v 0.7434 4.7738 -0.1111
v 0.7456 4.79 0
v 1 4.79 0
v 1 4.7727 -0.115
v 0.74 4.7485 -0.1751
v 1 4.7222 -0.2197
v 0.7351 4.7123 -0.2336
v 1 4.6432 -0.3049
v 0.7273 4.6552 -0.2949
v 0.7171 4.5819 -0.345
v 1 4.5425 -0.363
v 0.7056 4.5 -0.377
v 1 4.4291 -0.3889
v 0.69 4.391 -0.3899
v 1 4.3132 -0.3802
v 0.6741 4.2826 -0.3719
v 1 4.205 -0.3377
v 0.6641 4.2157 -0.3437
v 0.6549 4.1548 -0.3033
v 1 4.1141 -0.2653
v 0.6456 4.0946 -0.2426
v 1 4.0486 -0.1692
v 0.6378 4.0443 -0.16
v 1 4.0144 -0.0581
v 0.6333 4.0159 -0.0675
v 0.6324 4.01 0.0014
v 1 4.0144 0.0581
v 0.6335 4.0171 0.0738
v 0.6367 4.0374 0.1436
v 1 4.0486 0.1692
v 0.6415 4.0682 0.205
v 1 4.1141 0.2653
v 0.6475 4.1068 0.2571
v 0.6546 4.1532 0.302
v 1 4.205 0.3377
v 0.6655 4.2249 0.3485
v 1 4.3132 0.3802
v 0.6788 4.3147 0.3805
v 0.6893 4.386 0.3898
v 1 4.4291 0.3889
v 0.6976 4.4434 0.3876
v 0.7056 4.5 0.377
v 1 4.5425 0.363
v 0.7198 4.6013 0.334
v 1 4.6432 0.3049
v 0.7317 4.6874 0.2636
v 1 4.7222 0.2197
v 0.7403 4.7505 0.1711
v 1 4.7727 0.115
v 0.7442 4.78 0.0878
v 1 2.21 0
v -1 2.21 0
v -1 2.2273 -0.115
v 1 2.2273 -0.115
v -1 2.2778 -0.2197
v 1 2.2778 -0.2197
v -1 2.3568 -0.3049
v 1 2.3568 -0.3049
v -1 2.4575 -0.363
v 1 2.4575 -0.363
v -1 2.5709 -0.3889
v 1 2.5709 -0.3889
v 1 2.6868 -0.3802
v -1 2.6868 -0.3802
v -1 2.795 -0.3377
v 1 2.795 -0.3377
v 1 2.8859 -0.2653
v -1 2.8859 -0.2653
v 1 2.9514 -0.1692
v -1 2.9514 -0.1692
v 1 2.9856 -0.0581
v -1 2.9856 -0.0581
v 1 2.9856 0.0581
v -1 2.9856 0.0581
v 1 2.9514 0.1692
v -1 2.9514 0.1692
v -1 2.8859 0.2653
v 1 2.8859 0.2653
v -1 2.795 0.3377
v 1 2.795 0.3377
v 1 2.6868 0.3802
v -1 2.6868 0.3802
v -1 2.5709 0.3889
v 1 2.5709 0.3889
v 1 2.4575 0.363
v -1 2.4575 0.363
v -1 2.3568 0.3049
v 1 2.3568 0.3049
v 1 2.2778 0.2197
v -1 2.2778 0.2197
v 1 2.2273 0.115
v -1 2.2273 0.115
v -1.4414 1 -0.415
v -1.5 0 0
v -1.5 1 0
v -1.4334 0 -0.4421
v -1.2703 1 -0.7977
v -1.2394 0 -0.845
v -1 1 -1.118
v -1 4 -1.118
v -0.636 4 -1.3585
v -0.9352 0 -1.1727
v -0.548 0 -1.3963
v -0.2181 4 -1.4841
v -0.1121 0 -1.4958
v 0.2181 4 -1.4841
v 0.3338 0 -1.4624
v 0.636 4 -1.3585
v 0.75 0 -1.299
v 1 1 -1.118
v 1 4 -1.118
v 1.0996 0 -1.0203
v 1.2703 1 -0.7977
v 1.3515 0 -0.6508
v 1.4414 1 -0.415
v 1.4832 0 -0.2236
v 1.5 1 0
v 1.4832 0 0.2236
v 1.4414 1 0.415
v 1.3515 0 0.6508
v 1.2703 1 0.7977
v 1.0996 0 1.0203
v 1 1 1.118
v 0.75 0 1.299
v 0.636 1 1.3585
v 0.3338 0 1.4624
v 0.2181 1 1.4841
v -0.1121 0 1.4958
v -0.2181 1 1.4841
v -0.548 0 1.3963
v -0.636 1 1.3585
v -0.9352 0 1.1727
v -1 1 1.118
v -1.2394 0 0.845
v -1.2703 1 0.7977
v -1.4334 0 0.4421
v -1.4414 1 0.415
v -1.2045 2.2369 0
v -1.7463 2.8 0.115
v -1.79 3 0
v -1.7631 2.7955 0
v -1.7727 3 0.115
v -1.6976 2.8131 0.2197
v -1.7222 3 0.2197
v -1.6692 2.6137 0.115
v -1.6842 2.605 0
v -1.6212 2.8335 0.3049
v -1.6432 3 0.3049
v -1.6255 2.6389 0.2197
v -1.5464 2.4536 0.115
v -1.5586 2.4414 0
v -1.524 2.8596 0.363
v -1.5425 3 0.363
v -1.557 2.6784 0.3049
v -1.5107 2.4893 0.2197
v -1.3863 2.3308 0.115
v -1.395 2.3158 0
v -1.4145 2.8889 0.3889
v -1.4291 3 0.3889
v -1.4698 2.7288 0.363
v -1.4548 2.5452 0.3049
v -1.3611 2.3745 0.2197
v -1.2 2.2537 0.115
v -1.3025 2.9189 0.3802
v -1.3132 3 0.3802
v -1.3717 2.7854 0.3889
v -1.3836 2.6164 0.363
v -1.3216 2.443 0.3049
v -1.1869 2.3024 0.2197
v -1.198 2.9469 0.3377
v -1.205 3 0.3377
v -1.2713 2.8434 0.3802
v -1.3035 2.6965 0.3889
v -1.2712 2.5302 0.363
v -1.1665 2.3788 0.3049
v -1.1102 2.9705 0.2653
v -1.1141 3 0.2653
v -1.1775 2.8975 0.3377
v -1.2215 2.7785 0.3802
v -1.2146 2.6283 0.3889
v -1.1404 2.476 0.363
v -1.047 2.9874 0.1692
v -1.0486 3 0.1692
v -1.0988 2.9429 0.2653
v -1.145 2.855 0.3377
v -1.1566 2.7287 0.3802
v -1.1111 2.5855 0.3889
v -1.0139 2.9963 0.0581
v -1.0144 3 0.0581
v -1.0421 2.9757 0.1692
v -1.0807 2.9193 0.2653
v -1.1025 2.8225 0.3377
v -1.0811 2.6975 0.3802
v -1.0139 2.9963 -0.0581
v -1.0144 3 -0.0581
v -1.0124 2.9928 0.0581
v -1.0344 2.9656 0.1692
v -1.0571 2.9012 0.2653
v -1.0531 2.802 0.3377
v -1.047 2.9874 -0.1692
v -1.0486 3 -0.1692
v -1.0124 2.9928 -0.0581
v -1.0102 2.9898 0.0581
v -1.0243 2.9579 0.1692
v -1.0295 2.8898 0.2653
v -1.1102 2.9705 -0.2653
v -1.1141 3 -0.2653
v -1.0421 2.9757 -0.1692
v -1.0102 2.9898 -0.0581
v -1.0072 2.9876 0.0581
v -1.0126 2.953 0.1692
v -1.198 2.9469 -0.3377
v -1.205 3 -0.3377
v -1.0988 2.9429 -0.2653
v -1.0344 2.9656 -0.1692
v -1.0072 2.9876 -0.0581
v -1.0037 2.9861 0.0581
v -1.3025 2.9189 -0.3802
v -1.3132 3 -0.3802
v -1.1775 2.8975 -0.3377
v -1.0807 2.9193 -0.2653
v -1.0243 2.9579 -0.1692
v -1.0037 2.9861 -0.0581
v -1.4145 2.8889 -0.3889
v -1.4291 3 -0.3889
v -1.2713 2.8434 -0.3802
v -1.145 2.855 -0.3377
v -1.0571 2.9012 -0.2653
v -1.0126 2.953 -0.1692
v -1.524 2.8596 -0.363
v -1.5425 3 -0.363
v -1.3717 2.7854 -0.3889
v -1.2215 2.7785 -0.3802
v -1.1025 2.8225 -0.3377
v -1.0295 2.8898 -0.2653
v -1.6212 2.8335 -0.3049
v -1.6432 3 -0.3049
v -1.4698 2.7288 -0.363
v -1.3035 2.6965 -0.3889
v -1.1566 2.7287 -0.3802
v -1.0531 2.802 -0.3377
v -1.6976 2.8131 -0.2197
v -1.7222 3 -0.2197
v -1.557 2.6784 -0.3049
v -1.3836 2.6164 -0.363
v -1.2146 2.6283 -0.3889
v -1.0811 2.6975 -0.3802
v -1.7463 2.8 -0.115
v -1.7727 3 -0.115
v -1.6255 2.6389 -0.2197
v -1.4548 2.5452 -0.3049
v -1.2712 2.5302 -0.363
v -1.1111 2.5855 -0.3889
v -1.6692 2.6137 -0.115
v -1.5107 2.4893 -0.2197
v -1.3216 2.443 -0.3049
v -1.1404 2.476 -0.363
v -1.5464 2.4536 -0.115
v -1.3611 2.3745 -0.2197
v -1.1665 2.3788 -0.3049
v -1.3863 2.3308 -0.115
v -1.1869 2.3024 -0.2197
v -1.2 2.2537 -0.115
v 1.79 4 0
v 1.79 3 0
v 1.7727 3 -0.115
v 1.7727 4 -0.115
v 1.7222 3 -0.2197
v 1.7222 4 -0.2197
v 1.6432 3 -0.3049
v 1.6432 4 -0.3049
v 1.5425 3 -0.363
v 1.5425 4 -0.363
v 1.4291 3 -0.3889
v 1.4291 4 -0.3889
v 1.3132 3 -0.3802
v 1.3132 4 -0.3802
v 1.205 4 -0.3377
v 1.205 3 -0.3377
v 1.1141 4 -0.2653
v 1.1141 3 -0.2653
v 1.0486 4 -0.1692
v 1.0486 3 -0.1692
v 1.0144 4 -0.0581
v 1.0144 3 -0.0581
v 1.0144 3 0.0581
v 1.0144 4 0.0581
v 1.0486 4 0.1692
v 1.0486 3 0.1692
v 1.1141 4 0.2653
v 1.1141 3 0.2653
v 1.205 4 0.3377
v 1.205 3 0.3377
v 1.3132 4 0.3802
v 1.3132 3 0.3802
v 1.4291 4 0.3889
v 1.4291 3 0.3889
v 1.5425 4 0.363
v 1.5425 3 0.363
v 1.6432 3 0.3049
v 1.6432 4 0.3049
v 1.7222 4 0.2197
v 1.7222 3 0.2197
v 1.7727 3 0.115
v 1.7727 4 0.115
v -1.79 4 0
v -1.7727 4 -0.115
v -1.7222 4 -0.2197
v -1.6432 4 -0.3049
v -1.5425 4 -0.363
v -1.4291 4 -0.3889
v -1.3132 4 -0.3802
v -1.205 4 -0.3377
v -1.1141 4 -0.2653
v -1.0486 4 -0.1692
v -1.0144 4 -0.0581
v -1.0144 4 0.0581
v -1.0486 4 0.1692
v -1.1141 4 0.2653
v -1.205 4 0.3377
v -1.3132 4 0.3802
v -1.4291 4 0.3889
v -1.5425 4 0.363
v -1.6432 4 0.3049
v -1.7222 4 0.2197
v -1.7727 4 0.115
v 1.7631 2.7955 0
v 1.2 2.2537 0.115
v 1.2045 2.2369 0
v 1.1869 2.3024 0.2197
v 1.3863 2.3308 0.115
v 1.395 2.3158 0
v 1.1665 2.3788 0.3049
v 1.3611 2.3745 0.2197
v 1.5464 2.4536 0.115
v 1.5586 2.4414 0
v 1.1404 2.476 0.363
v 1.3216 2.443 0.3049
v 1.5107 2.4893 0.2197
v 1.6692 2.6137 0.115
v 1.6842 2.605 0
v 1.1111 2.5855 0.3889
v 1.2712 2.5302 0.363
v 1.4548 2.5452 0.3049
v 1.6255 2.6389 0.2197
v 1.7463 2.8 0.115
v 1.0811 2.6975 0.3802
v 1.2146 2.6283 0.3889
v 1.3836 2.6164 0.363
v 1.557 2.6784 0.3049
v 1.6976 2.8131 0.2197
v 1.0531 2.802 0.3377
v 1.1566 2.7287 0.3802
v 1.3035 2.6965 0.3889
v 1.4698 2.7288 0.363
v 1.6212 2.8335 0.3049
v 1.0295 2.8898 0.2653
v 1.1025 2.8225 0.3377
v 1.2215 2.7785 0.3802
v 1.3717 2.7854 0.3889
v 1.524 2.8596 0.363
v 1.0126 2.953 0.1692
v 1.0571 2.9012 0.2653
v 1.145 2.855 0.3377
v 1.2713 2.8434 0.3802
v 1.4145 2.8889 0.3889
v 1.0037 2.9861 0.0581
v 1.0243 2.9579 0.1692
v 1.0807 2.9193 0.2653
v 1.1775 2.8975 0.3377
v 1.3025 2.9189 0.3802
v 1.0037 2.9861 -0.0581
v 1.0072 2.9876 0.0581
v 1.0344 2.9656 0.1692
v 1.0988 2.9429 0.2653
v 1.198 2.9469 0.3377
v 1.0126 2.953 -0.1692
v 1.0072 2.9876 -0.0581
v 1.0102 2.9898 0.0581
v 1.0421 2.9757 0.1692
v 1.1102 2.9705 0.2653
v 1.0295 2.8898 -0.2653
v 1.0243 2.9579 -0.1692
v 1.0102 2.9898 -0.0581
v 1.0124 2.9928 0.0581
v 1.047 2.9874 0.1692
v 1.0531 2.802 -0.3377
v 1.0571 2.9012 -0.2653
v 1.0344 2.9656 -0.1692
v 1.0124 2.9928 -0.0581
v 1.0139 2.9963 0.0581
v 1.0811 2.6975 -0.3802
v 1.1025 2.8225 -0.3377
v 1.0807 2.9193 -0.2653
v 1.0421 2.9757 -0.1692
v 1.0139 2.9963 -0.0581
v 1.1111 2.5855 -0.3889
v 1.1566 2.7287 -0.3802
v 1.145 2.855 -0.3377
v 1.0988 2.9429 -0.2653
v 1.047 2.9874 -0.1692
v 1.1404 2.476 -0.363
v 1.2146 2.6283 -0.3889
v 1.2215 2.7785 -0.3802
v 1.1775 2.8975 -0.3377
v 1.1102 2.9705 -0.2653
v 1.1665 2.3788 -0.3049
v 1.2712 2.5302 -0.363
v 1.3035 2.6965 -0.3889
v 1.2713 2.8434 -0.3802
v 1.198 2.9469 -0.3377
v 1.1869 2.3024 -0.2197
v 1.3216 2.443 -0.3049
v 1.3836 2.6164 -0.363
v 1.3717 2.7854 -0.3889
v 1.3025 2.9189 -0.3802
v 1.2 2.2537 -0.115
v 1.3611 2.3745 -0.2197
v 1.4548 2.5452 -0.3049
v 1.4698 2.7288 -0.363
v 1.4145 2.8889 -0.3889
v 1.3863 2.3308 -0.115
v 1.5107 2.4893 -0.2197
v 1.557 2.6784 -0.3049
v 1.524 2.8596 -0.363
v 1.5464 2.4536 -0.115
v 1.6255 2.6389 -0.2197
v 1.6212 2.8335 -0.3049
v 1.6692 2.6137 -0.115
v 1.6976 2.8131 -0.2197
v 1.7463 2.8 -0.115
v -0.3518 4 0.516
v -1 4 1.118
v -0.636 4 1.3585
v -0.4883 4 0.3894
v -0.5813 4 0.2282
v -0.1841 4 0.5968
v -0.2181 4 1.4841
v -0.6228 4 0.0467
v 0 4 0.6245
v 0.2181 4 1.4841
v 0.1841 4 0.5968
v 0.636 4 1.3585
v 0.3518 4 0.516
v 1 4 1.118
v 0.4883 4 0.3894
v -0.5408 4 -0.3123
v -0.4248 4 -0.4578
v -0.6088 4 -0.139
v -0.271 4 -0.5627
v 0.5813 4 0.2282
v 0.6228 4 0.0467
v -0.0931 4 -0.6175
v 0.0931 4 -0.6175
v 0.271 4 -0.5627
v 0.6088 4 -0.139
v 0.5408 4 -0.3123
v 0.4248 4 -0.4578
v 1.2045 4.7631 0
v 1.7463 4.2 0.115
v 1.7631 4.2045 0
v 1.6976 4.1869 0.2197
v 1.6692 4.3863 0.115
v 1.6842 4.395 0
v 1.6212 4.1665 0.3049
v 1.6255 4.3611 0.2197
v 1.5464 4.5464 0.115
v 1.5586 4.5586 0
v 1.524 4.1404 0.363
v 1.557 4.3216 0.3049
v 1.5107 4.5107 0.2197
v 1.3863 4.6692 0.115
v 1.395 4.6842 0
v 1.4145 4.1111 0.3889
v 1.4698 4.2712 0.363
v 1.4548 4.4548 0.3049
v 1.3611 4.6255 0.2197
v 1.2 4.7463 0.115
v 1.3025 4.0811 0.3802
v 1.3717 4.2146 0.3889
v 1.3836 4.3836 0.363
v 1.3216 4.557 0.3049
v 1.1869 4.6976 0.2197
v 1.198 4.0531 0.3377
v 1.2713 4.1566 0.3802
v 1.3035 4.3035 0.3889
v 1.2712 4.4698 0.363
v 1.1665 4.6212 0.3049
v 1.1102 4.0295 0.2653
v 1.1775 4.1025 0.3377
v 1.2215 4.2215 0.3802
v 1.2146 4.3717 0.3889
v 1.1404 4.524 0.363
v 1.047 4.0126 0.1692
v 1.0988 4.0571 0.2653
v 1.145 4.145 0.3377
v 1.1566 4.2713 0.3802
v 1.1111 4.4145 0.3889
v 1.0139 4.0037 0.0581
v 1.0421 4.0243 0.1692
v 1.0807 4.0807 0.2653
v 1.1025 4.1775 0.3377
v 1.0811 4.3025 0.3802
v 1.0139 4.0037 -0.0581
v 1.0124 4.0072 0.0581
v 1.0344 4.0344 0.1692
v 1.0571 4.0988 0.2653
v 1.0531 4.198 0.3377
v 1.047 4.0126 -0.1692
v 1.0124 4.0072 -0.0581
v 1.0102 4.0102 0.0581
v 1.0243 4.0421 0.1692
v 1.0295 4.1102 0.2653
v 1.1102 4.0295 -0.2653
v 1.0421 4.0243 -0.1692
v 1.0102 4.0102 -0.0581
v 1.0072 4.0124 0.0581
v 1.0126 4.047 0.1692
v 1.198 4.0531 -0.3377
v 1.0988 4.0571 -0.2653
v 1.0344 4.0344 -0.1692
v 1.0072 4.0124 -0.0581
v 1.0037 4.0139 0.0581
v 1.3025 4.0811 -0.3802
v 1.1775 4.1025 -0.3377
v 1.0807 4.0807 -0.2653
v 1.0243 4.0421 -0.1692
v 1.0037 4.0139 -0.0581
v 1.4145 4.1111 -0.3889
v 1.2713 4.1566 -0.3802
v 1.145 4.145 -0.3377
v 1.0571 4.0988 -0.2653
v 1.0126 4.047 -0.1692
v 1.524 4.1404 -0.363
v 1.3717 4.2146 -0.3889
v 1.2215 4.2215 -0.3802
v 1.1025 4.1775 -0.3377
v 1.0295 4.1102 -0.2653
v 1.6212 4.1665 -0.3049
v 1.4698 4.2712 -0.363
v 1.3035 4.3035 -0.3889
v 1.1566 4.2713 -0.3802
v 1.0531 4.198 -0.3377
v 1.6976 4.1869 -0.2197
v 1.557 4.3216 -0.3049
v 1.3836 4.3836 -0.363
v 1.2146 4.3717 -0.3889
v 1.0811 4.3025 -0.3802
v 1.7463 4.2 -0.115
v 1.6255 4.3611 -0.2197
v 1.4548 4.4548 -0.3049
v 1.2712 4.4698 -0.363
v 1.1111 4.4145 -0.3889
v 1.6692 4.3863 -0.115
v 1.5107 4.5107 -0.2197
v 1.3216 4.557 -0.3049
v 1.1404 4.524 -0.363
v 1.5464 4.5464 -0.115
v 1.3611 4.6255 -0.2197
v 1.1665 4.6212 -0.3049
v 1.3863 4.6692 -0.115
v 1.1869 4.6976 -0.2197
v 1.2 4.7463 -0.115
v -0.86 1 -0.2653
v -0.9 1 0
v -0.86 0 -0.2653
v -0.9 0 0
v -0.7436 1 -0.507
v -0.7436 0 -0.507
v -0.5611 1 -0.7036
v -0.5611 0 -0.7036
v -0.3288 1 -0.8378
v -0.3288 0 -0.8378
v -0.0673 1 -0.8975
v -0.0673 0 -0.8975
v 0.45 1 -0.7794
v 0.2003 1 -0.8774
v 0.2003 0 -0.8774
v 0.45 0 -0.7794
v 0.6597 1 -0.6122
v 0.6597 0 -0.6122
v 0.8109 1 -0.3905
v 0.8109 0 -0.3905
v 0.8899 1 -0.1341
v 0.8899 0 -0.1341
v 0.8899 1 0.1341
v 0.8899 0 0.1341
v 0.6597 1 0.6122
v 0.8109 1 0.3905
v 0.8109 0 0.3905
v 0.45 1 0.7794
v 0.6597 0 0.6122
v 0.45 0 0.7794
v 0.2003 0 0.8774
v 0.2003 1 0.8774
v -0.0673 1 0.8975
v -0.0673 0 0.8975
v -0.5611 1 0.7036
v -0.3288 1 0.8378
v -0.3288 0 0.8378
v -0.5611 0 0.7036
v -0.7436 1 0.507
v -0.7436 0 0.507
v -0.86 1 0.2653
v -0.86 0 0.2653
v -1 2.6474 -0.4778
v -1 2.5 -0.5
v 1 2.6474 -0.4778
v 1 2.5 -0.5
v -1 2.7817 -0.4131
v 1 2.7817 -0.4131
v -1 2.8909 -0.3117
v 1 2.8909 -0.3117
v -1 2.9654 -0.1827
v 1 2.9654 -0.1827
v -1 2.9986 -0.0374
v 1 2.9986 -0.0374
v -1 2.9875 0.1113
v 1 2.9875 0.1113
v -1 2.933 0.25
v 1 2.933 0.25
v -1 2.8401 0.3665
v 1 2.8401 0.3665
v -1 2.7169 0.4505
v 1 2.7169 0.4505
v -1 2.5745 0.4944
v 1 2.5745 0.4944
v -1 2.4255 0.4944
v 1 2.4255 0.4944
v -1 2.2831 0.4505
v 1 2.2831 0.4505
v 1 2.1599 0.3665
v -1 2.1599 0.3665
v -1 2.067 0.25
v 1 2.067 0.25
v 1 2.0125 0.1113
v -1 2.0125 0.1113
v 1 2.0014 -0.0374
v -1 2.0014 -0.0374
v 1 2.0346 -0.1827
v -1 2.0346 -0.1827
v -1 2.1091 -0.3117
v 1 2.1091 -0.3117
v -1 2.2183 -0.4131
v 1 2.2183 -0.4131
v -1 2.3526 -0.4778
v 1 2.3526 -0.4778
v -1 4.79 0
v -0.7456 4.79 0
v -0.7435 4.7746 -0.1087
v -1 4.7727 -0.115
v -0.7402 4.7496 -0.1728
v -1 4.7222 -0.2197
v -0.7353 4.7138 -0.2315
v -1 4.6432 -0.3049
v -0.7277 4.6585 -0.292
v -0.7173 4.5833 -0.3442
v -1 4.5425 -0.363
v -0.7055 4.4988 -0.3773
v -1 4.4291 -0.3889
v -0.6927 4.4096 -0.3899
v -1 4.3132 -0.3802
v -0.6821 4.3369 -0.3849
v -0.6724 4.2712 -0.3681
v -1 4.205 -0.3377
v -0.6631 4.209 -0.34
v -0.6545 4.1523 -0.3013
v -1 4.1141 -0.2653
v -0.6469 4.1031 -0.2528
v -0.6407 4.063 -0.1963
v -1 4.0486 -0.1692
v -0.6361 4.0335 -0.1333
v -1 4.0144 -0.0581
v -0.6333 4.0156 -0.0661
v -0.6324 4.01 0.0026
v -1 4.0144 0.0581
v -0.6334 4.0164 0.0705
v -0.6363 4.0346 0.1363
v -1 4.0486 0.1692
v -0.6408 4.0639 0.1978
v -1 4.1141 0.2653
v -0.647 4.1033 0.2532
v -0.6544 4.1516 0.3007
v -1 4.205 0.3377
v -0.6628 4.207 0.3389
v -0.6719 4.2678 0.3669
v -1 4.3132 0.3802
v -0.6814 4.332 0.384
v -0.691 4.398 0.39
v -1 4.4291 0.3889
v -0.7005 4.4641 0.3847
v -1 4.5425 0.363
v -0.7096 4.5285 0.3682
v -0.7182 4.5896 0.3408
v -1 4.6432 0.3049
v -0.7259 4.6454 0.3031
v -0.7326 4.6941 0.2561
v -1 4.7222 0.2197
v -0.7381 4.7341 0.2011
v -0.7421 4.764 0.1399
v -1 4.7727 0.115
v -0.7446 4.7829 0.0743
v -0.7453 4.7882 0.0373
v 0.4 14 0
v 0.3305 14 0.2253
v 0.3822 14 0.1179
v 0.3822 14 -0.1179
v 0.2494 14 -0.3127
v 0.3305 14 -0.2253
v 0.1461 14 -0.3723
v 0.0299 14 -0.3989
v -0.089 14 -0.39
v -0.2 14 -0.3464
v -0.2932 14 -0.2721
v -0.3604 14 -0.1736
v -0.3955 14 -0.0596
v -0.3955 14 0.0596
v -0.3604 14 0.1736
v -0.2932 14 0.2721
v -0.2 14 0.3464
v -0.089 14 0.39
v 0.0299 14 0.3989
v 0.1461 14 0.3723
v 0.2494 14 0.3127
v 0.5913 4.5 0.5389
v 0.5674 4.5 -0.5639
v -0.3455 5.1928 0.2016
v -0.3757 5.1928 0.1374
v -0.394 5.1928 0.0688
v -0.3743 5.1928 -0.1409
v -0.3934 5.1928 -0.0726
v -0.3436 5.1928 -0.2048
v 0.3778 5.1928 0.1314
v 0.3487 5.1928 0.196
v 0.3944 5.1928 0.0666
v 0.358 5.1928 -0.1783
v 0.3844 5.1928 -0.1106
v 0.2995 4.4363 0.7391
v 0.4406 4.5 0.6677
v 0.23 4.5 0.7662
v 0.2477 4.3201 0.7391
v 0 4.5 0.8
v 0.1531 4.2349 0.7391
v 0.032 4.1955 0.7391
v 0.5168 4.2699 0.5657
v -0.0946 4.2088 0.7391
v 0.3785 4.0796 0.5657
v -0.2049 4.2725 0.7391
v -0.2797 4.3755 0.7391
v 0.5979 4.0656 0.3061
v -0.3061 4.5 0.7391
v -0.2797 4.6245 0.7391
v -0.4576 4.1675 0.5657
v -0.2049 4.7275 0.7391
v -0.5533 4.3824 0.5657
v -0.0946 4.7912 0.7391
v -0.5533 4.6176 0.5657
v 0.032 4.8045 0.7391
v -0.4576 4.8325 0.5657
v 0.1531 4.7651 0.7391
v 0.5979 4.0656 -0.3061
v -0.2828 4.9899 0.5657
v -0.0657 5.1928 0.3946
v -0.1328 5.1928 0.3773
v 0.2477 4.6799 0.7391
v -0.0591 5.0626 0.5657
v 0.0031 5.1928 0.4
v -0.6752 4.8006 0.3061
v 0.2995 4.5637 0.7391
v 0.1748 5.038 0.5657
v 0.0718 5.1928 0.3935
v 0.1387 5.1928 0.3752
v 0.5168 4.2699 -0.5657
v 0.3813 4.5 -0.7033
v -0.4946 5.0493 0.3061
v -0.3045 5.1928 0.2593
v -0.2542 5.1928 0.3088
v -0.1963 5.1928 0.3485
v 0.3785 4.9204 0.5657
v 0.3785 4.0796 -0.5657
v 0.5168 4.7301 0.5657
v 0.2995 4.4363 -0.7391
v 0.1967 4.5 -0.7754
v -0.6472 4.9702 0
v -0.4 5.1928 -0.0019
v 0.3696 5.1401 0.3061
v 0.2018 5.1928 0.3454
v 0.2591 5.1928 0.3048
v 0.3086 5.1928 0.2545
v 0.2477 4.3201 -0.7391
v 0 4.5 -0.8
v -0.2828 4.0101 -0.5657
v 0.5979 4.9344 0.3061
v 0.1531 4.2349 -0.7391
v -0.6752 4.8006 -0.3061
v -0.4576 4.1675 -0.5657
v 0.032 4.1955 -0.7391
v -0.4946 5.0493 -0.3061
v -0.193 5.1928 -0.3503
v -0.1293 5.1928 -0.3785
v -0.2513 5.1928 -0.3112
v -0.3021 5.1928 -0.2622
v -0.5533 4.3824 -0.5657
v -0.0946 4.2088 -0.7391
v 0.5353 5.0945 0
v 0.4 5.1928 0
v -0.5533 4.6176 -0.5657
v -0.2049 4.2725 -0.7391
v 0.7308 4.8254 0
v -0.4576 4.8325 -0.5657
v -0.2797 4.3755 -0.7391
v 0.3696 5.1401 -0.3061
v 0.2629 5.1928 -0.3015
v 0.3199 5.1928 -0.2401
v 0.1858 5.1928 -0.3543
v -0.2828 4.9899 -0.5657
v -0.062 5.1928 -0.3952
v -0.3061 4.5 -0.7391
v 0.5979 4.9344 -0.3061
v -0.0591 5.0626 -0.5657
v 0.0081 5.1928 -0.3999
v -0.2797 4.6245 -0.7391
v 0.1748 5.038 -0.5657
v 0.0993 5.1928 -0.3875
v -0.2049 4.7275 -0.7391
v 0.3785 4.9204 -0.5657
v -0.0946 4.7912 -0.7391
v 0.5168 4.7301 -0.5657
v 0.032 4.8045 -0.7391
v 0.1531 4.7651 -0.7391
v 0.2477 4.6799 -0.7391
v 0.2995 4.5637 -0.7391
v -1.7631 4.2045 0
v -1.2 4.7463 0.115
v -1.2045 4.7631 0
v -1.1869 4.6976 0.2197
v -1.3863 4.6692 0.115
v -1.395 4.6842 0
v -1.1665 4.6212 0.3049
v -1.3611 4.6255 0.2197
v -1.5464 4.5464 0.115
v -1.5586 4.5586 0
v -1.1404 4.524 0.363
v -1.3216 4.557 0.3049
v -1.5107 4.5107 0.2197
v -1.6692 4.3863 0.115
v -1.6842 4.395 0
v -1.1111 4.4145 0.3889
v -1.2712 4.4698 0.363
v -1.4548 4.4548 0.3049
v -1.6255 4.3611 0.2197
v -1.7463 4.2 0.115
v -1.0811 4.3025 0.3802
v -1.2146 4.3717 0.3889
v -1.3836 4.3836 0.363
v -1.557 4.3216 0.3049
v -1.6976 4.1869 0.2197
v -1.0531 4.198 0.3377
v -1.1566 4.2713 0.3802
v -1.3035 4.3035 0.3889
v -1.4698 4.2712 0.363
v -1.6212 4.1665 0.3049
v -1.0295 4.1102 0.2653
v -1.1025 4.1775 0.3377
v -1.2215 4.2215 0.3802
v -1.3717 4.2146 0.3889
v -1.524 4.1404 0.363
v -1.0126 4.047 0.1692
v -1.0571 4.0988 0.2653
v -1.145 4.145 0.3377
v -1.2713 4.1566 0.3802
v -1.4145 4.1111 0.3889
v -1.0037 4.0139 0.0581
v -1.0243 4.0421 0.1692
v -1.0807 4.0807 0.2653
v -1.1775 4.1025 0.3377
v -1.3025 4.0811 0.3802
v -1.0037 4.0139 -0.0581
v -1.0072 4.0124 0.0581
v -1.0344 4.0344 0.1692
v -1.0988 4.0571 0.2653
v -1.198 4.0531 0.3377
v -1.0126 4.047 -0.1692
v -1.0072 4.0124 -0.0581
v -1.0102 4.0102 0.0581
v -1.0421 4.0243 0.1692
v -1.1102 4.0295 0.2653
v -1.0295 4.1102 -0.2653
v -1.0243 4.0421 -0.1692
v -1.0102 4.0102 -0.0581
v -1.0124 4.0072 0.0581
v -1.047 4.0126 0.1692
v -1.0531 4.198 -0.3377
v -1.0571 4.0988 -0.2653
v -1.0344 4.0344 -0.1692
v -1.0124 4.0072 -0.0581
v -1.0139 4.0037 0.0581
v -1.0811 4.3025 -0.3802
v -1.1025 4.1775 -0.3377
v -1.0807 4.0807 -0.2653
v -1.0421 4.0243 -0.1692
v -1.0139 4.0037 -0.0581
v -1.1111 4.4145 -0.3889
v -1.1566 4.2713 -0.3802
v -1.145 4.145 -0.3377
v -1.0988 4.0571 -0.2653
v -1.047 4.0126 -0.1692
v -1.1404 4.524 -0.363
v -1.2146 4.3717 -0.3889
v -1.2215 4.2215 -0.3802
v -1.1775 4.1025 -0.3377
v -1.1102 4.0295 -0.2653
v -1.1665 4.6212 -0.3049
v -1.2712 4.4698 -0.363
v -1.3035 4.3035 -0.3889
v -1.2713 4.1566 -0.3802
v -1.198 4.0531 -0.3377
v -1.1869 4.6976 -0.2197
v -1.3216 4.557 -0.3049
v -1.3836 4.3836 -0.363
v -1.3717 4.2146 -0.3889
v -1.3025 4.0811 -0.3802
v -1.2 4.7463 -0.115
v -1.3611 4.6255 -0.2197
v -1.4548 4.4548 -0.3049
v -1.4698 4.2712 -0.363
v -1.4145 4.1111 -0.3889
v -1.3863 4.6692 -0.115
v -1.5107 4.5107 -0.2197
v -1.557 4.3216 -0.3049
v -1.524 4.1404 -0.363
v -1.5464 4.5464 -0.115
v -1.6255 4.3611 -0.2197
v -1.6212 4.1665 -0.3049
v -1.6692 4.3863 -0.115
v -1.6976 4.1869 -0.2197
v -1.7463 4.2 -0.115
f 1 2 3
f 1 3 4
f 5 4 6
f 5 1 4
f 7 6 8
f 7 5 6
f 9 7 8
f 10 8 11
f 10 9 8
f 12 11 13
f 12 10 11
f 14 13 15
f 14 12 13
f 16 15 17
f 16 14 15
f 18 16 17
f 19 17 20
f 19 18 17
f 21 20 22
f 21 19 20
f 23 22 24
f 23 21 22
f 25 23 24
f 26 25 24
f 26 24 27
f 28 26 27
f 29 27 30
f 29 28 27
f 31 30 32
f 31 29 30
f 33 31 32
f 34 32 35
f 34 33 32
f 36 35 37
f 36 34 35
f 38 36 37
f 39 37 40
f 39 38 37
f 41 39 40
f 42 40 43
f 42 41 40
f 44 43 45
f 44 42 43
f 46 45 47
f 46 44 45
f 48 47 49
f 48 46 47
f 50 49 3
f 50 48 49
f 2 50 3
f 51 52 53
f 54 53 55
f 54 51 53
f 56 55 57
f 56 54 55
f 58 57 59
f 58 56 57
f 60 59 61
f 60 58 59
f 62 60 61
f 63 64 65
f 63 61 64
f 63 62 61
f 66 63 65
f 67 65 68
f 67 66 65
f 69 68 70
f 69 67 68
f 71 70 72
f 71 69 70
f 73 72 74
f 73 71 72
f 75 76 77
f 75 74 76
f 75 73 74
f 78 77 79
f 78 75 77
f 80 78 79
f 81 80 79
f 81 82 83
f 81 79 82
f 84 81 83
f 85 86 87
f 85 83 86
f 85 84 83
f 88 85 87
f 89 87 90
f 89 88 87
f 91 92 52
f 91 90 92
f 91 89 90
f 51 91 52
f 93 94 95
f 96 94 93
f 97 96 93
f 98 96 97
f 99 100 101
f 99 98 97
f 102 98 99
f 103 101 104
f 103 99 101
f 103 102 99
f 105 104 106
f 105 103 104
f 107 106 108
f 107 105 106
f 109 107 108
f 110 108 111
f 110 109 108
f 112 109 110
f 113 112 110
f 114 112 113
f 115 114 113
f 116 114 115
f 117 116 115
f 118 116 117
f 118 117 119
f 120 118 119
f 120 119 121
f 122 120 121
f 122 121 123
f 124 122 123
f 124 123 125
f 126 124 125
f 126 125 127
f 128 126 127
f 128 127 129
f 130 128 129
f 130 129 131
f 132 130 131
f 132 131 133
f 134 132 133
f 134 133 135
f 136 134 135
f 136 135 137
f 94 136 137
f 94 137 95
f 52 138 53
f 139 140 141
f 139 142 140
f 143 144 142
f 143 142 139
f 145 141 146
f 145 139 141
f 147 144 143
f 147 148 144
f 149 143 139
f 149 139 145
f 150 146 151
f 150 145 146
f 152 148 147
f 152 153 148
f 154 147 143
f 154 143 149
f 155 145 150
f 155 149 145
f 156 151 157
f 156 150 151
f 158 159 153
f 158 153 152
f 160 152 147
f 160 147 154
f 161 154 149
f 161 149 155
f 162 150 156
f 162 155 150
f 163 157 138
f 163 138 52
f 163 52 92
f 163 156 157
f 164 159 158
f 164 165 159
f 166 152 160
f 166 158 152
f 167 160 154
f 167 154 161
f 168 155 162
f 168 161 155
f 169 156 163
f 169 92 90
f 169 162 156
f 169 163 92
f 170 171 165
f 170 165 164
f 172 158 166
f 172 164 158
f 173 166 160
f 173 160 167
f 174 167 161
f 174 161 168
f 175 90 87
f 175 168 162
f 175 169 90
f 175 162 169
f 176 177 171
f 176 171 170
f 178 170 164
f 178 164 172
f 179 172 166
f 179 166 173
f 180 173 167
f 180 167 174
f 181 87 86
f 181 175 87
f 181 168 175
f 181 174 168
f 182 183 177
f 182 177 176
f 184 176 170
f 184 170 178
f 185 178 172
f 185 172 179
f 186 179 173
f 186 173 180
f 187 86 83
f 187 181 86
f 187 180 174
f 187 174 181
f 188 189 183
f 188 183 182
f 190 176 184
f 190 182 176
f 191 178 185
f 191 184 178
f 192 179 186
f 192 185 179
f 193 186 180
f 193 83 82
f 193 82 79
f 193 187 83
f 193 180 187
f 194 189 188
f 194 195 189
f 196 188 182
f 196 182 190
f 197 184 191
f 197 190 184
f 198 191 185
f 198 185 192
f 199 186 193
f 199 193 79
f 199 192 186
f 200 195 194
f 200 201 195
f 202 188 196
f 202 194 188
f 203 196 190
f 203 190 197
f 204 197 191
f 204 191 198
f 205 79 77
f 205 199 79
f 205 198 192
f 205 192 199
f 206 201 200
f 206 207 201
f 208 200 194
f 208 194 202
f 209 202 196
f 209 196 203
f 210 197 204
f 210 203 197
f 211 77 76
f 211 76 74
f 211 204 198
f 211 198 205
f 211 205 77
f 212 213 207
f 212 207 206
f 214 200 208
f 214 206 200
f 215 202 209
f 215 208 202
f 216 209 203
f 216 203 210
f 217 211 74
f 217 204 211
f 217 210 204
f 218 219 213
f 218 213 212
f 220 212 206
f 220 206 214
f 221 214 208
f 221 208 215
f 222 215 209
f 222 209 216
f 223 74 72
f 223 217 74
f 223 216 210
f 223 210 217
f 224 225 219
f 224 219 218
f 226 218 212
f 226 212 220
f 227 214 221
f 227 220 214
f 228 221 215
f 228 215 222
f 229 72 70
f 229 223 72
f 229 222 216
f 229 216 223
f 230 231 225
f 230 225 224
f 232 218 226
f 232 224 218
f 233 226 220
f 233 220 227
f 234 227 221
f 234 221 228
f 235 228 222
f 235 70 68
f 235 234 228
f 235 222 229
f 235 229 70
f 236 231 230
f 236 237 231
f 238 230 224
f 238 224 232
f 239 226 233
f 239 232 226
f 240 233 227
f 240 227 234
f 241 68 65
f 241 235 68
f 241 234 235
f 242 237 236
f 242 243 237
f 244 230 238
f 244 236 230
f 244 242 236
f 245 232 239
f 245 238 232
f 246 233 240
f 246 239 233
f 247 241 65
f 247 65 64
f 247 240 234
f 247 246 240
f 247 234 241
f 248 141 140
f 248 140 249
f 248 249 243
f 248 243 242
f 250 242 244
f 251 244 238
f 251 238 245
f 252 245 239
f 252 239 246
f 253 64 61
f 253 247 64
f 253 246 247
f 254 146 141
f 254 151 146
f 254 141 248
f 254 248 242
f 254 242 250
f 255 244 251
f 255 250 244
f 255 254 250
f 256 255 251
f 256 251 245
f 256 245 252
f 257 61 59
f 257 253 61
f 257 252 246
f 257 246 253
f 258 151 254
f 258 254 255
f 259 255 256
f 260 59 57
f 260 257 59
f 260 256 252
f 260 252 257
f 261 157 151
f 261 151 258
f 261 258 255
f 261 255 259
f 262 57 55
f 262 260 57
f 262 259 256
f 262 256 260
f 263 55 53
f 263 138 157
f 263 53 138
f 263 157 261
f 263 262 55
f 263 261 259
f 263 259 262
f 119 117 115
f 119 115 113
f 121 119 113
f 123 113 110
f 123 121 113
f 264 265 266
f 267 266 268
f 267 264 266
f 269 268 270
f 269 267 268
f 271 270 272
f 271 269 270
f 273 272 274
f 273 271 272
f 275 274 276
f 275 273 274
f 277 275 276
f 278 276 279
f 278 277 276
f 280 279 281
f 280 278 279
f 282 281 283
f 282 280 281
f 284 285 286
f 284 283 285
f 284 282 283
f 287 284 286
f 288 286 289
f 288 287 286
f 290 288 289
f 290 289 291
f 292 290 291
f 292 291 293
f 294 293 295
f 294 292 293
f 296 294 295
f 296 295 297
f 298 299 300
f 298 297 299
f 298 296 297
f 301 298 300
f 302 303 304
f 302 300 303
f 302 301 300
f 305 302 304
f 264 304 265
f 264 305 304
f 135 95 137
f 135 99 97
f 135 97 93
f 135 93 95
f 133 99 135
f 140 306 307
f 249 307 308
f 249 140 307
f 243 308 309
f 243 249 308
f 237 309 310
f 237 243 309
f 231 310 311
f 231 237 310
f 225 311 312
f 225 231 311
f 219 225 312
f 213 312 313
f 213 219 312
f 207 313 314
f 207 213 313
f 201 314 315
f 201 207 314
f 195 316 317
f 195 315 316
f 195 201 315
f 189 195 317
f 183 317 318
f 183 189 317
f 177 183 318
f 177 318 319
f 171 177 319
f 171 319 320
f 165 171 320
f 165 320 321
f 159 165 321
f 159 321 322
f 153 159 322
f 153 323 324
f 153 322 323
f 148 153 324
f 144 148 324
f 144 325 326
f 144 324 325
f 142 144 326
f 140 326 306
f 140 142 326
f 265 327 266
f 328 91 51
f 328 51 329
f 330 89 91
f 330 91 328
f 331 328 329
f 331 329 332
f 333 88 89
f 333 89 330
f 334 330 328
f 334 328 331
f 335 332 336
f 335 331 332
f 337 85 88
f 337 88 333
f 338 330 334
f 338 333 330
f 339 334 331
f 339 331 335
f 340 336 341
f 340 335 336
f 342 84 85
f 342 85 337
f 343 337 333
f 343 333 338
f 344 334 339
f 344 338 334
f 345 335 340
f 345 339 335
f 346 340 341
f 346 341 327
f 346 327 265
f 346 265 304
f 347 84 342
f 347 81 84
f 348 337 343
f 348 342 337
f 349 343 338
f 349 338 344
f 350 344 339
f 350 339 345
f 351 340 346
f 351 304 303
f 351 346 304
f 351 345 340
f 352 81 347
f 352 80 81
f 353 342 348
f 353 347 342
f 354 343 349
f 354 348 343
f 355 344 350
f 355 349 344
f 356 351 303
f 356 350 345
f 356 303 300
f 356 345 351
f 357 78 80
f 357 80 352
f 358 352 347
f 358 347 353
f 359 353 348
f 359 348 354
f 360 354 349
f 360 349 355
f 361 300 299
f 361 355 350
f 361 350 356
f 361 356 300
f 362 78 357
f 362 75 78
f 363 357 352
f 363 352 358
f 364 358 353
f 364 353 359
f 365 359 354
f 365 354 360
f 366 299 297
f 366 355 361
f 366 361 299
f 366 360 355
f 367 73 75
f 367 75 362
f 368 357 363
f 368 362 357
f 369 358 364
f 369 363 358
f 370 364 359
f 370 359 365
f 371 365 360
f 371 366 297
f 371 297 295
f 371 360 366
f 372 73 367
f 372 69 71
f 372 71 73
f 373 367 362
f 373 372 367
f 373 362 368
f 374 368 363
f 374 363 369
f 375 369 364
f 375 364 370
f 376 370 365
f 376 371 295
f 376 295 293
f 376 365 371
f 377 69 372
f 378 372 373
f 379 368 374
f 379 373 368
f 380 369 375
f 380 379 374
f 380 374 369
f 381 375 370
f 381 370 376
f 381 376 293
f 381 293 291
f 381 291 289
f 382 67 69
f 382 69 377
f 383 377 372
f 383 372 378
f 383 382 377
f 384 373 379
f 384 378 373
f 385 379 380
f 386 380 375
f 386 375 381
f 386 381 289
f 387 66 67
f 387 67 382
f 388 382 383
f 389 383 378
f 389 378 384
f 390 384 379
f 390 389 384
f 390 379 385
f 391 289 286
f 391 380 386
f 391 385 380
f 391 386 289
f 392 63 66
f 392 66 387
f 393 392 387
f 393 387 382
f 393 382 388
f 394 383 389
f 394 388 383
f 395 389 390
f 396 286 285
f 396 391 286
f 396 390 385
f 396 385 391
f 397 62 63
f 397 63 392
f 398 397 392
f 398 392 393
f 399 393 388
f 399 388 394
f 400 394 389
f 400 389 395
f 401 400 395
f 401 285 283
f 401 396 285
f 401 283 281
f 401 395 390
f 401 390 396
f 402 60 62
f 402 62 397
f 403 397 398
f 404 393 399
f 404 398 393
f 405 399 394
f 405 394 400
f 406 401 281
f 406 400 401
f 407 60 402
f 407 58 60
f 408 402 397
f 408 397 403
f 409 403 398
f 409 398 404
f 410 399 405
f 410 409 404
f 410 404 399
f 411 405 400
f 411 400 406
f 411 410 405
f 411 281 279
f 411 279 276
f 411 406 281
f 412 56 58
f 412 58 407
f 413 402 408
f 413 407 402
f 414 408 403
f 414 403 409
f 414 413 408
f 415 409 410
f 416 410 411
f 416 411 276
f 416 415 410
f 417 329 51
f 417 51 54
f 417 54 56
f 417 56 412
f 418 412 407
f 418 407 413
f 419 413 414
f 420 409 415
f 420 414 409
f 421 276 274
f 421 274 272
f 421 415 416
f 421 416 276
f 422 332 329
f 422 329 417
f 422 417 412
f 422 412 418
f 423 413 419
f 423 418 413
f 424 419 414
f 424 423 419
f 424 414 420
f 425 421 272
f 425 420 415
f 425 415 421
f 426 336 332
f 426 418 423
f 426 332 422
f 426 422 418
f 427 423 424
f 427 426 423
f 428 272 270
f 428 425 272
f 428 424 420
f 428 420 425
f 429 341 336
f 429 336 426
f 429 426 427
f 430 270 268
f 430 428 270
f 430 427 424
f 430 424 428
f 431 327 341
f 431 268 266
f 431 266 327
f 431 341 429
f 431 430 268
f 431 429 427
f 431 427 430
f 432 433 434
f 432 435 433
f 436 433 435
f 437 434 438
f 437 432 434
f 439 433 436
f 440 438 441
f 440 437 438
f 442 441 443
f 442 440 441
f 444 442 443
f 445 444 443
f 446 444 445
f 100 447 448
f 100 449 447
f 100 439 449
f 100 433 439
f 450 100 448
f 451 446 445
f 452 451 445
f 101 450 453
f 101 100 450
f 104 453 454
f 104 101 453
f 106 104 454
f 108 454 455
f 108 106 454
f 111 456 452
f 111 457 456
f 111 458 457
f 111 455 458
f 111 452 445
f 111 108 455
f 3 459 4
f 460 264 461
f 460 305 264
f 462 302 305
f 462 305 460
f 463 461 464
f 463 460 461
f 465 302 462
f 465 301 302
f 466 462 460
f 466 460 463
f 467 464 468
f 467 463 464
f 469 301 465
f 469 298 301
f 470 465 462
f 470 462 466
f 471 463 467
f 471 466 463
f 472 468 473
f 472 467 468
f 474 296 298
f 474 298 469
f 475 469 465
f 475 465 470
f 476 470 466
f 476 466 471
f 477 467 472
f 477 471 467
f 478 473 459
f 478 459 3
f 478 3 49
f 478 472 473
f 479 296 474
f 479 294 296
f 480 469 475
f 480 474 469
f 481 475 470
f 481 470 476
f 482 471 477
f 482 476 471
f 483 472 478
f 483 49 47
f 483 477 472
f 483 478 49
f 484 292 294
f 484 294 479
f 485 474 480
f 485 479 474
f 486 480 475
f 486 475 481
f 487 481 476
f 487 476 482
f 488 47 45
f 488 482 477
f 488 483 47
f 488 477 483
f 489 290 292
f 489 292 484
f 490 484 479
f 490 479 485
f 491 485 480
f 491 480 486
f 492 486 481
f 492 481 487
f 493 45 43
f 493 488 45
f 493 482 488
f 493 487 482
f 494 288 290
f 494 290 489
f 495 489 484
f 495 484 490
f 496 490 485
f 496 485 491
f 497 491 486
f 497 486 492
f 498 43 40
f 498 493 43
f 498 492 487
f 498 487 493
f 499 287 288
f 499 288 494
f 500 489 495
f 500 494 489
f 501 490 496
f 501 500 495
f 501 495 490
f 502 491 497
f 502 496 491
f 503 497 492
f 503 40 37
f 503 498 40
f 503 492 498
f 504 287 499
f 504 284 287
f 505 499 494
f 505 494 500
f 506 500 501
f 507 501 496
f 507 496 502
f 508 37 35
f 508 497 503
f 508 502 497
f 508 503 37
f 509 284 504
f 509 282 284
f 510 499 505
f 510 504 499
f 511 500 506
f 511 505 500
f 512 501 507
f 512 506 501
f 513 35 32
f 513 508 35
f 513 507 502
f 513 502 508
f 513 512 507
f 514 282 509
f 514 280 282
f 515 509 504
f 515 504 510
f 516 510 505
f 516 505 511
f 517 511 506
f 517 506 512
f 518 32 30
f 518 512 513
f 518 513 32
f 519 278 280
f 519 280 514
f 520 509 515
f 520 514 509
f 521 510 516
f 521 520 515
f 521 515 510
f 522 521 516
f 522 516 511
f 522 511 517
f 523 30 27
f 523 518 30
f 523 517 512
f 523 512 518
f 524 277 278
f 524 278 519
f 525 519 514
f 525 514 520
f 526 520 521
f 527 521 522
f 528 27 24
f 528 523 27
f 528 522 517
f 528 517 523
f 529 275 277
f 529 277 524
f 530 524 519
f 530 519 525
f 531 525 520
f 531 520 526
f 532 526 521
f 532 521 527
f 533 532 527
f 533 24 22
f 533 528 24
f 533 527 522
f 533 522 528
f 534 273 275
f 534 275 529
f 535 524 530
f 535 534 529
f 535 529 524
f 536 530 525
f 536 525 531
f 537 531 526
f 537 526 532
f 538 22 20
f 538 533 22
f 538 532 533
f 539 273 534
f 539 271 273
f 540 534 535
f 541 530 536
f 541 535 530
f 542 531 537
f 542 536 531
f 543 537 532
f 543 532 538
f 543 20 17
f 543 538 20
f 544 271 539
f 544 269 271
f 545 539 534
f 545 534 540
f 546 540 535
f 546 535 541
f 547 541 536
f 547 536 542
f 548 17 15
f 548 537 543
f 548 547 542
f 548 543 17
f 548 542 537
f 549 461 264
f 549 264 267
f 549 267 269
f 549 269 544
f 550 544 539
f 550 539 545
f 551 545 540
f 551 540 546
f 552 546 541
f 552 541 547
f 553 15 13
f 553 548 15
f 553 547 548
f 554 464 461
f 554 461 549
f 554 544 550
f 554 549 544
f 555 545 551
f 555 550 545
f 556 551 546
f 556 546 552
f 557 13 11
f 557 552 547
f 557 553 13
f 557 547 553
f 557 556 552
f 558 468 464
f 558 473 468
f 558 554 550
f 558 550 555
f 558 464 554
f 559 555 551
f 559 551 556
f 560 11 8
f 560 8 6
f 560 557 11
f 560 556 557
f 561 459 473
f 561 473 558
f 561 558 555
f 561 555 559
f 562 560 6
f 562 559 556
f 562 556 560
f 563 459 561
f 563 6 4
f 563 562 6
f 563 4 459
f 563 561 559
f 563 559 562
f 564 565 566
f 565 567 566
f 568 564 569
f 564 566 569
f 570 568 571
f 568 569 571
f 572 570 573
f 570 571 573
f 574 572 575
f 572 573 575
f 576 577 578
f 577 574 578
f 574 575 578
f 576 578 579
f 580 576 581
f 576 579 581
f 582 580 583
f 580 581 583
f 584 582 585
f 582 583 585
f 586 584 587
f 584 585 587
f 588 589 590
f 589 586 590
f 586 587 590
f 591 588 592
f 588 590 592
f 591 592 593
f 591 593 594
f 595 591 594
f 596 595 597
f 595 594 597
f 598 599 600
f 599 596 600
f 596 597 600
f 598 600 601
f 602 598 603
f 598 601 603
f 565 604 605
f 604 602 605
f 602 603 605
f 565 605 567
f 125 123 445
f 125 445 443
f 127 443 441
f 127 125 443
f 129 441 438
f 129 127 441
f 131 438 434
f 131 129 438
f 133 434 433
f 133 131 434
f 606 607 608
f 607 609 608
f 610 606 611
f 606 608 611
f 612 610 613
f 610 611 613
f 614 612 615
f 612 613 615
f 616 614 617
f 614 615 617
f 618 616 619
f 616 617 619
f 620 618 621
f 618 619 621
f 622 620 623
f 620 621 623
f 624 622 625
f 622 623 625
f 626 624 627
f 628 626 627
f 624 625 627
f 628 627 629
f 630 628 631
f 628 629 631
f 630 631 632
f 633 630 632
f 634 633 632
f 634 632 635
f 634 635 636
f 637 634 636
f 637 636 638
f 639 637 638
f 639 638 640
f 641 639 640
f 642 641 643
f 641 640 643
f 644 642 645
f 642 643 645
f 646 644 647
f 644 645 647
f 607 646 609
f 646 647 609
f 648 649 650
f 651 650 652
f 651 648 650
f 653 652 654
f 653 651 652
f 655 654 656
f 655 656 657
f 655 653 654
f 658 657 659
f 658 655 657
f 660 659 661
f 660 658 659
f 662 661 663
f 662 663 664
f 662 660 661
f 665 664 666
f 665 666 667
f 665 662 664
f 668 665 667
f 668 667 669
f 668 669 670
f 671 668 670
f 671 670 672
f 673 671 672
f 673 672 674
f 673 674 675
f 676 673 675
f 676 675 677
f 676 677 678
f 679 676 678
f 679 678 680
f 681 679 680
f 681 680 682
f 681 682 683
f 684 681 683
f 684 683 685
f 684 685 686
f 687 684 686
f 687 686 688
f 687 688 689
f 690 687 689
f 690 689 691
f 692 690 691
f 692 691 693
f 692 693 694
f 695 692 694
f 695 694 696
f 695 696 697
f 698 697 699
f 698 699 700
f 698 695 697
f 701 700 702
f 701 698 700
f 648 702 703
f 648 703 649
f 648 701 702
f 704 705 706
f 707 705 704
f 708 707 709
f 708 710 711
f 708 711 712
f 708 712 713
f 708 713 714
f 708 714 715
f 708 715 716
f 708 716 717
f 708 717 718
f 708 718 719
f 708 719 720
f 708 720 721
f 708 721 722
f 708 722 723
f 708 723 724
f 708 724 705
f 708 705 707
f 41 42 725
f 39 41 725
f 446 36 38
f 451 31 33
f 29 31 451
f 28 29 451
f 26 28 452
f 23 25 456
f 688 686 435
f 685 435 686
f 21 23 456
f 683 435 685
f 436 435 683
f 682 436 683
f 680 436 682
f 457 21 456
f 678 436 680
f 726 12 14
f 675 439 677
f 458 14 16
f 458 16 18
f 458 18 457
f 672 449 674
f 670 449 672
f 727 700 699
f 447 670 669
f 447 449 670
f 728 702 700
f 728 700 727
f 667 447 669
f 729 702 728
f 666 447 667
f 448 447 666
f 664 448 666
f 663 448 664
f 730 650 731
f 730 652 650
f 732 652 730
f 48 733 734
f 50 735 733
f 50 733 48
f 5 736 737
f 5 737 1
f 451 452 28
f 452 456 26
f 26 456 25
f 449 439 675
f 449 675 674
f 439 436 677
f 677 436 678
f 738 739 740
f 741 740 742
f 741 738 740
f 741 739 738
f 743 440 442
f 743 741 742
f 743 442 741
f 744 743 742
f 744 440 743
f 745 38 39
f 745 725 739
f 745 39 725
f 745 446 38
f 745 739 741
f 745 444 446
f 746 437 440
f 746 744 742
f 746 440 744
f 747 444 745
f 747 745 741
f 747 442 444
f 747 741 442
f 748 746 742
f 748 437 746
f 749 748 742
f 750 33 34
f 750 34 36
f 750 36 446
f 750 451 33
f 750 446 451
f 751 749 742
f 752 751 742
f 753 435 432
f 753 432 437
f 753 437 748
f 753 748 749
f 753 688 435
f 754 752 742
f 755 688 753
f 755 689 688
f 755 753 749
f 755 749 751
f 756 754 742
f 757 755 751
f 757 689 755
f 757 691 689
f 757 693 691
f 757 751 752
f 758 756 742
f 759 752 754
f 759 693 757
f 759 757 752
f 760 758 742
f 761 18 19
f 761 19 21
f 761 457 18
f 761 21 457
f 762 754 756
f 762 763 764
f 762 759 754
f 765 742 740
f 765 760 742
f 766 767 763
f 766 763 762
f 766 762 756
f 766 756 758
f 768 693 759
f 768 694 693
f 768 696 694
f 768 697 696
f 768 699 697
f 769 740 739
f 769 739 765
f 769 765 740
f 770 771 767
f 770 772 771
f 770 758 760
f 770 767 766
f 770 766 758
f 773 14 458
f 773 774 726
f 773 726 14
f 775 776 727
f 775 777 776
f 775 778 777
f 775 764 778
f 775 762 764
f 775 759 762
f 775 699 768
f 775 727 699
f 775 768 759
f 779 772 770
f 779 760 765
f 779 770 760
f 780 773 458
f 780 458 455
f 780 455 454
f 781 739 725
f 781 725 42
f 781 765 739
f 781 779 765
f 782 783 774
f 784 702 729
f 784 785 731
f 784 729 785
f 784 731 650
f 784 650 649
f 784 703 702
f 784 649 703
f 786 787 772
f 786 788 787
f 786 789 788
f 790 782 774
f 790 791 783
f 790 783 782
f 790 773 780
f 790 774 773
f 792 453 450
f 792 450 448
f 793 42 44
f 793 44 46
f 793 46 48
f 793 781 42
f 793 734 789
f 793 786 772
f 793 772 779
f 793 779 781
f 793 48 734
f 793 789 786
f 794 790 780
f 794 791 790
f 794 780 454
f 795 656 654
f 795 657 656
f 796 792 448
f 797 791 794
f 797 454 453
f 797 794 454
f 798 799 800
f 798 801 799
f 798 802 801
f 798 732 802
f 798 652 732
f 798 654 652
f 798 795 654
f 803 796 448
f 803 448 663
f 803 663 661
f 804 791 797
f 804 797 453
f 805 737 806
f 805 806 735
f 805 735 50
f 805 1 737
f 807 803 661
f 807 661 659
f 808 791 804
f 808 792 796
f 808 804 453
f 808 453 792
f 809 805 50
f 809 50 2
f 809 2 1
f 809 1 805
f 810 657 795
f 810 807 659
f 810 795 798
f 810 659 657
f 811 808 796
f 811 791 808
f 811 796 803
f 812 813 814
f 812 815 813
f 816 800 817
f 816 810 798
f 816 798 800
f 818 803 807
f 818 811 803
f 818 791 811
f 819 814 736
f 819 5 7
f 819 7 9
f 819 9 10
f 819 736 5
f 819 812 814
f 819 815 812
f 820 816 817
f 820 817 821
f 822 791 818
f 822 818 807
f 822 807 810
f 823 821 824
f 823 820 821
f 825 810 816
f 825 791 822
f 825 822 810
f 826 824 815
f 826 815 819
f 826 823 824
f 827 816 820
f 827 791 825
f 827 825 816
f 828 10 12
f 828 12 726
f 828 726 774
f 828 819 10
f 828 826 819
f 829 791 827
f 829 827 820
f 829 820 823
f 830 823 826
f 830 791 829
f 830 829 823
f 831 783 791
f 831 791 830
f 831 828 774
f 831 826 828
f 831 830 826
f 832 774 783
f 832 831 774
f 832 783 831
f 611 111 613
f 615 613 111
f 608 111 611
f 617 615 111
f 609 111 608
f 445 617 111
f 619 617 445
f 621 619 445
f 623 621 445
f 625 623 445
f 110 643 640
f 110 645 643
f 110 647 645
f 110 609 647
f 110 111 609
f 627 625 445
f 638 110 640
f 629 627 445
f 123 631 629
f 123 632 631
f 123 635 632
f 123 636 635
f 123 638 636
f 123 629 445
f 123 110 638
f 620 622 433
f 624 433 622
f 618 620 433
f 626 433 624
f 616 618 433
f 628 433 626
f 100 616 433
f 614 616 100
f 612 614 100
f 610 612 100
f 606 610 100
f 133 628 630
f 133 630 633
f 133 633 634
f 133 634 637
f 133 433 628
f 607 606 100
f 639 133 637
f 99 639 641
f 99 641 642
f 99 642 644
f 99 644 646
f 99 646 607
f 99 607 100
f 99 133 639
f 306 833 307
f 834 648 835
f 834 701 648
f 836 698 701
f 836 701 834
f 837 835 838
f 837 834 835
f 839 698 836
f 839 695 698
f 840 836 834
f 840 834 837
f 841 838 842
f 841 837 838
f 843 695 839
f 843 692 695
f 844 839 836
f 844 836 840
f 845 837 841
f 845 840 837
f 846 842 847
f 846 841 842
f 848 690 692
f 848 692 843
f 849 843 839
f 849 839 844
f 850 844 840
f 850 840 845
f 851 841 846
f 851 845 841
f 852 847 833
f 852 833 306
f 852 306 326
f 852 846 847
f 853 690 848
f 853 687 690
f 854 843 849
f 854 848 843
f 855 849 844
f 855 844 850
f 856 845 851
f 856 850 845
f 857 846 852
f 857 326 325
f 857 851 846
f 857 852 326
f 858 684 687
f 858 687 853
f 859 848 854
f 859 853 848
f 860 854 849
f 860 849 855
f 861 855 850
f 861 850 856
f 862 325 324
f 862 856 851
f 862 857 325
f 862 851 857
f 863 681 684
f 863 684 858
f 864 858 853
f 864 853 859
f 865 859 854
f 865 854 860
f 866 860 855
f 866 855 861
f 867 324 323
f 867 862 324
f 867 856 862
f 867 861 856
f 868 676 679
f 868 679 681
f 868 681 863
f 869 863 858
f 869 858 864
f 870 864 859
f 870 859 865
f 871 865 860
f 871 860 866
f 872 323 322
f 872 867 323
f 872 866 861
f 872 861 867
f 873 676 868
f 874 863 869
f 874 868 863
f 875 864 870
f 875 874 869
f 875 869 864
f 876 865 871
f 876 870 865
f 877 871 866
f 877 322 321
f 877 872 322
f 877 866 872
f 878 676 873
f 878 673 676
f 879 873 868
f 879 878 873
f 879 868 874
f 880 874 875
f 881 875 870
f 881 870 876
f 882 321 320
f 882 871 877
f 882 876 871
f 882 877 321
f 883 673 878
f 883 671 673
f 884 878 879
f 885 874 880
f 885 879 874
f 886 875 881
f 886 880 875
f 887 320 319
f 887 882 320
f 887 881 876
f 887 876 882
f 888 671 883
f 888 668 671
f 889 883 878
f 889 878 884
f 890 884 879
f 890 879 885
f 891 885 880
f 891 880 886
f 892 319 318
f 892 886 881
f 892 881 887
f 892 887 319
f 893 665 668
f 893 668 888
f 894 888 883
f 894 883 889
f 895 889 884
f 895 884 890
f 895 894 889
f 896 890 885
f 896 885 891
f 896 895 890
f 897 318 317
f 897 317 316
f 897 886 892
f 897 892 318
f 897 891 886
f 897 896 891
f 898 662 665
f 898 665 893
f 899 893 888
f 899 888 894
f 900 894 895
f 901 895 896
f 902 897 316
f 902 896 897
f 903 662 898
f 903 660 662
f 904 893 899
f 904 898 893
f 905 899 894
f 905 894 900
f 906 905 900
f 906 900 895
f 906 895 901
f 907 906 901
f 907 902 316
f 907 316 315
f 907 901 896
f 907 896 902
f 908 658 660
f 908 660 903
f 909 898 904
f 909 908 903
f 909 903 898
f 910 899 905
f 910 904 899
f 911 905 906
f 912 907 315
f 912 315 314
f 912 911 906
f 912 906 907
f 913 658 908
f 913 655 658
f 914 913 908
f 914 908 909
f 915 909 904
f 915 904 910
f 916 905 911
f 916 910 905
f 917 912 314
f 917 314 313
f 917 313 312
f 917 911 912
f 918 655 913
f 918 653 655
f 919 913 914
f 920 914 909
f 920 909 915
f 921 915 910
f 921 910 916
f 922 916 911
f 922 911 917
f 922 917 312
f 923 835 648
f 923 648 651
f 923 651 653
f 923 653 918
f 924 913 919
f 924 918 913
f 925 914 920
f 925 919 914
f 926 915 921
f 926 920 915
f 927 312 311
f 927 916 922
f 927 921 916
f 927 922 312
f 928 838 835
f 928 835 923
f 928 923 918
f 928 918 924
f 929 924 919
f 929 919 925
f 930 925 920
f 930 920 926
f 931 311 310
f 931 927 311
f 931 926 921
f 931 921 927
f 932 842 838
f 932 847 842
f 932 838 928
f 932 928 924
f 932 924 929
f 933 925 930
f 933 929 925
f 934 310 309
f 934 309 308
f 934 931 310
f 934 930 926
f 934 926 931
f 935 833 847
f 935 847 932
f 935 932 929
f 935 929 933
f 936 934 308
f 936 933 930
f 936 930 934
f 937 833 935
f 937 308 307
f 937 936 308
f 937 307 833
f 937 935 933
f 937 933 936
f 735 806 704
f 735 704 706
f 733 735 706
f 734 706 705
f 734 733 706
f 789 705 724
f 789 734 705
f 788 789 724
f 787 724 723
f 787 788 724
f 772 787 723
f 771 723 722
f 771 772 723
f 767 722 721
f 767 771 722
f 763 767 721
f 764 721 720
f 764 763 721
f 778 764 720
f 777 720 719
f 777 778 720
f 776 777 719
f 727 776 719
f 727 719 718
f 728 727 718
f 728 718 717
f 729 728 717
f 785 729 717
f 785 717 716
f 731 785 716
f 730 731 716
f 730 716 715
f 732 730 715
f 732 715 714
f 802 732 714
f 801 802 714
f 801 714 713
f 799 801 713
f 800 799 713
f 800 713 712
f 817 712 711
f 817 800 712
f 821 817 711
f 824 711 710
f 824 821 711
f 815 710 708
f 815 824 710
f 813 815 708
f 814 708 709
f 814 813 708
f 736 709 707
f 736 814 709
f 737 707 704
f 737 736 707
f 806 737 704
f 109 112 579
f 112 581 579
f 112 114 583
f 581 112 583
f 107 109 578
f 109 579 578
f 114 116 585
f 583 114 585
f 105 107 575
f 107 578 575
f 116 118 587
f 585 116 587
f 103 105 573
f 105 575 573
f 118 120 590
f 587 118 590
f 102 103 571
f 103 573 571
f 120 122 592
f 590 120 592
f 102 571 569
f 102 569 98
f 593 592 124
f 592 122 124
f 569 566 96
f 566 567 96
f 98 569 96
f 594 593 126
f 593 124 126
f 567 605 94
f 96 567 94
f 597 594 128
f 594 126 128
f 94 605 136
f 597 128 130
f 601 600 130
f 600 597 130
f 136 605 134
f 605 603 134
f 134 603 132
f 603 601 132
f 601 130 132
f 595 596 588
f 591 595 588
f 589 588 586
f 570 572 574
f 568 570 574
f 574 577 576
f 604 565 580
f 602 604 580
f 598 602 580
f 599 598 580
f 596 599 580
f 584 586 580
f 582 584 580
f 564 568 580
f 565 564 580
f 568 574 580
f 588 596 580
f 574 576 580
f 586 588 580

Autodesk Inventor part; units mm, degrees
ref_plane "YZ Plane" through (0, 0, 0) normal (1, 0, 0) x (0, 1, 0)
ref_plane "XZ Plane" through (0, 0, 0) normal (0, 1, 0) x (-1, 0, 0)
sketch "스케치2" plane through (0, 0, 0) normal (0, 1, 0) x (-1, 0, 0)
  circle A0 centre (0, 0) radius 1.5
  circle A1 centre (0, 0) radius 0.9
  dimension "d0" = 3
  dimension "d6" = 1.8
extrude "돌출1" add sketch "스케치2" along normal blind 1
sketch "스케치4" plane through (0, 1, 0) normal (0, 1, 0) x (1, 0, 0)
  line L0 (1, -3.1) -> (-1, -3.1)
  line L1 (-1, -3.1) -> (-1, 3.1)
  line L2 (-1, 3.1) -> (1, 3.1)
  line L3 (1, 3.1) -> (1, -3.1)
  line L4 (1, -3.1) -> (-1, 3.1) construction
  line L5 (-1, -3.1) -> (1, 3.1) construction
  circle A0 centre (0, 0) radius 1.5 projected
  point P0 (1, 1.118034)
  point P1 (-1, 1.118034)
  point P2 (-1, -1.118034)
  point P3 (1, -1.118034)
  dimension "d7" = 2
extrude "돌출5" add sketch "스케치4" along normal blind 3 contours A0 L1 L3
sketch "스케치6" plane through (1, 1, 1.118034) normal (1, 0, 0) x (0, 0, -1)
  circle A0 centre (1.118034, 1.5) radius 0.5
  line L0 (0, 3) -> (2.236068, 3)
  point P0 (1.118034, -1)
  dimension "d22" = 1
  dimension "d23" = 1.5
extrude "돌출6" cut sketch "스케치6" along normal through all both and the other way through all
sketch "Sketch7" plane through (0, 4, 0) normal (0, 1, 0) x (1, 0, 0)
  circle A0 centre (0, 0) radius 0.4
  dimension "d26" = 0.8
extrude "Extrusion7" add sketch "Sketch7" along normal blind 10
sketch "Sketch8" plane through (0, 0, 0) normal (0, 0, 1) x (1, 0, 0)
  line L0 (0.264968, 4.4) -> (-1, 4.4)
  line L1 (-1.4, 4) -> (-1.4, 3)
  line L2 (-1, 2.6) -> (0.264968, 2.6)
  line L3 (1, 4) -> (-1, 4)
  line L4 (0.264968, 4.4) -> (1, 4.4)
  line L5 (1.4, 4) -> (1.4, 3)
  line L6 (1, 2.6) -> (0.264968, 2.6)
  line L7 (1, 1) -> (1, 4)
  line L8 (-1, 1) -> (-1, 4)
  arc A0 (-1, 4.4) -> (-1.4, 4) centre (-1, 4) ccw
  arc A1 (1.4, 4) -> (1, 4.4) centre (1, 4) ccw
  line L9 (-1, 3) -> (1, 3)
  arc A2 (-1.4, 3) -> (-1, 2.6) centre (-1, 3) ccw
  arc A3 (1, 2.6) -> (1.4, 3) centre (1, 3) ccw
  point P0 (0, 0)
  dimension "d29" = 0.4
  dimension "d30" = 1.4
  dimension "d32" = 0.4
  dimension "d33" = 0.4
sketch "Sketch9" plane through (0, 0, 0) normal (1, 0, 0) x (0, 1, 0)
  circle A0 centre (4.4, 0) radius 0.39
  line L0 (14, -0.4) -> (14, 0.4) projected
  line L1 (4, 0.4) -> (4, -0.4) projected
  point P0 (0, 0)
  dimension "d34" = 0.78
sweep "Sweep1" add profiles "Sketch9" path "Sketch8" path curves L0 A0 L1 A2 L2 L6 A3 L5 A1 L4
ref_plane "Work Plane2" through (0, 4.5, 0) normal (0, 1, 0) x (1, 0, 0)
sketch "Sketch11" plane through (0, 4.5, 0) normal (0, 1, 0) x (1, 0, 0)
  circle A0 centre (0, 0) radius 0.9 projected
  circle A1 centre (0, 0) radius 0.8
  line L0 (0, -0.8) -> (0, 0.8)
  dimension "d40" = 1.6
sketch "Sketch11 outline for Revolution2" plane through (0, 4.5, 0) normal (0, 1, 0) x (1, 0, 0)
  line L0 (0, 0.8) -> (0, -0.8)
  arc A0 (0, -0.8) -> (0, 0.8) centre (0, 0) ccw
revolve "Revolution2" add sketch "Sketch11 outline for Revolution2" angle 360 about axis through (0, 4.5, 0.8) along (0, 0, -1)
properties part number "dummy_anchor_end_3.0mm_w_string"
